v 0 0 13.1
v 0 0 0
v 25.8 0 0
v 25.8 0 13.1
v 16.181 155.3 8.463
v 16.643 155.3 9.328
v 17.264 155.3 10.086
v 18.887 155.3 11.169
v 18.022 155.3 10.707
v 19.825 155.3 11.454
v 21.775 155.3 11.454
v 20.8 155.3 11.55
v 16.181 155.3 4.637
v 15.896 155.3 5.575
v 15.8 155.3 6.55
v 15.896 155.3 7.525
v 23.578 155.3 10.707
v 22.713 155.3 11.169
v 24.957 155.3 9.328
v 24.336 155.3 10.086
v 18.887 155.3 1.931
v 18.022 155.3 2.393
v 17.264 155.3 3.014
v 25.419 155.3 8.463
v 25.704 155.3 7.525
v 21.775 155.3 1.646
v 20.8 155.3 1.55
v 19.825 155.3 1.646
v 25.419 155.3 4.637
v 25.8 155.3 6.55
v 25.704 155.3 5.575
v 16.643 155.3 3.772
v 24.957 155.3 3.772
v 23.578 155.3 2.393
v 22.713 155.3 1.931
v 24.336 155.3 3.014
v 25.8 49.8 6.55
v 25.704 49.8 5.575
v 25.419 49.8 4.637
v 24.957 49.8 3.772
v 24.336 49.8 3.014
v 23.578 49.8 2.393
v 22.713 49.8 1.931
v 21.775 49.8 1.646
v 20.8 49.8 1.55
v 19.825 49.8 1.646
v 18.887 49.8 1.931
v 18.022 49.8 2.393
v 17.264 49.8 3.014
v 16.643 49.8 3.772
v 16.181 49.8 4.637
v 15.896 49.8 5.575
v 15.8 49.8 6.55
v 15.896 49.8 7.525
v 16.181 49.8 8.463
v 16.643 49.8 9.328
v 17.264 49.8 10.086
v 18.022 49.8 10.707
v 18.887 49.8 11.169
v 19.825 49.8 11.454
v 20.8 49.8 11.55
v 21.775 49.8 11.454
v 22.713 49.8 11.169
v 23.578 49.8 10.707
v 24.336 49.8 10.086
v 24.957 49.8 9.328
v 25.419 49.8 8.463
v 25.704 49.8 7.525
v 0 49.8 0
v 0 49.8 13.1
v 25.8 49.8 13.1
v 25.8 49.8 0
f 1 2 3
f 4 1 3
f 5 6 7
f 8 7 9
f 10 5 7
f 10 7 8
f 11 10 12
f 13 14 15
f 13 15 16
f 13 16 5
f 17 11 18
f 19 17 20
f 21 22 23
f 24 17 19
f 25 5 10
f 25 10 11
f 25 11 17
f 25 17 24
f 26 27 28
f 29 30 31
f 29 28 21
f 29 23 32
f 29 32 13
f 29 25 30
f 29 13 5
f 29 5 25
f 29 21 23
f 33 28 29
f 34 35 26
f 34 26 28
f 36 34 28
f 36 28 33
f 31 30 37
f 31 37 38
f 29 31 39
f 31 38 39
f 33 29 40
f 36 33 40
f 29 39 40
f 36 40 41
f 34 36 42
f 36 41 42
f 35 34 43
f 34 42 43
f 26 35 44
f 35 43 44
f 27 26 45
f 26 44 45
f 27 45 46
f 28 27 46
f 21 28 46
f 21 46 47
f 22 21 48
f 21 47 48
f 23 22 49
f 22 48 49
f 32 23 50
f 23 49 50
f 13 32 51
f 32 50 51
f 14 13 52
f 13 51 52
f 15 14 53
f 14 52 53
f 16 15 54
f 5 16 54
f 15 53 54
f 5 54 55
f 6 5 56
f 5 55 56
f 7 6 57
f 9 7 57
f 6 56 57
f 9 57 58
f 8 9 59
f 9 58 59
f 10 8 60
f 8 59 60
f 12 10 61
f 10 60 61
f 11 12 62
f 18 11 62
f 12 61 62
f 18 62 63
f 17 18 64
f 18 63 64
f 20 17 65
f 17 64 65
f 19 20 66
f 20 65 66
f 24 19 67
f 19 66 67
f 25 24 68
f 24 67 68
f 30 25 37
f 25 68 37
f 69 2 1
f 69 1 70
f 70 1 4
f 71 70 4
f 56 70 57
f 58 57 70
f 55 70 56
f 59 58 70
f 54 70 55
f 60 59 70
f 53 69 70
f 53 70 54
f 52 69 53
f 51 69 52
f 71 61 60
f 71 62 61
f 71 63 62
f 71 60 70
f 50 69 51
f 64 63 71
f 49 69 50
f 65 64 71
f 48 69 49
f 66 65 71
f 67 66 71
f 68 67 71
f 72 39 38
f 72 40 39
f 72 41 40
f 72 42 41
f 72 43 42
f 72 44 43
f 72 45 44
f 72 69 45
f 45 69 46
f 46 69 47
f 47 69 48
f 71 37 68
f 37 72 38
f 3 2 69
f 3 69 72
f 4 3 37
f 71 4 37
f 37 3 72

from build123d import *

# Parameters (mm, degrees)
SKETCH2_W           = 25.8
SKETCH2_H           = 49.8
BOSS_EXTRUDE1_DEPTH = 13.1
SKETCH3_R           = 5
BOSS_EXTRUDE2_DEPTH = 105.5


with BuildPart() as part:
    # Sketch2 → Boss-Extrude1 (new body)
    with BuildSketch(Plane.XY):
        with Locations((12.9, 24.9)):
            Rectangle(SKETCH2_W, SKETCH2_H)
    extrude(amount=BOSS_EXTRUDE1_DEPTH)

    # Sketch3 → Boss-Extrude2 (add)
    with BuildSketch(Plane(origin=(0, 49.8, 0), x_dir=(1, 0, 0), z_dir=(0, 1, 0))):
        with Locations((20.8, -6.55)):
            Circle(SKETCH3_R)
    extrude(amount=BOSS_EXTRUDE2_DEPTH)


solid = part.part
